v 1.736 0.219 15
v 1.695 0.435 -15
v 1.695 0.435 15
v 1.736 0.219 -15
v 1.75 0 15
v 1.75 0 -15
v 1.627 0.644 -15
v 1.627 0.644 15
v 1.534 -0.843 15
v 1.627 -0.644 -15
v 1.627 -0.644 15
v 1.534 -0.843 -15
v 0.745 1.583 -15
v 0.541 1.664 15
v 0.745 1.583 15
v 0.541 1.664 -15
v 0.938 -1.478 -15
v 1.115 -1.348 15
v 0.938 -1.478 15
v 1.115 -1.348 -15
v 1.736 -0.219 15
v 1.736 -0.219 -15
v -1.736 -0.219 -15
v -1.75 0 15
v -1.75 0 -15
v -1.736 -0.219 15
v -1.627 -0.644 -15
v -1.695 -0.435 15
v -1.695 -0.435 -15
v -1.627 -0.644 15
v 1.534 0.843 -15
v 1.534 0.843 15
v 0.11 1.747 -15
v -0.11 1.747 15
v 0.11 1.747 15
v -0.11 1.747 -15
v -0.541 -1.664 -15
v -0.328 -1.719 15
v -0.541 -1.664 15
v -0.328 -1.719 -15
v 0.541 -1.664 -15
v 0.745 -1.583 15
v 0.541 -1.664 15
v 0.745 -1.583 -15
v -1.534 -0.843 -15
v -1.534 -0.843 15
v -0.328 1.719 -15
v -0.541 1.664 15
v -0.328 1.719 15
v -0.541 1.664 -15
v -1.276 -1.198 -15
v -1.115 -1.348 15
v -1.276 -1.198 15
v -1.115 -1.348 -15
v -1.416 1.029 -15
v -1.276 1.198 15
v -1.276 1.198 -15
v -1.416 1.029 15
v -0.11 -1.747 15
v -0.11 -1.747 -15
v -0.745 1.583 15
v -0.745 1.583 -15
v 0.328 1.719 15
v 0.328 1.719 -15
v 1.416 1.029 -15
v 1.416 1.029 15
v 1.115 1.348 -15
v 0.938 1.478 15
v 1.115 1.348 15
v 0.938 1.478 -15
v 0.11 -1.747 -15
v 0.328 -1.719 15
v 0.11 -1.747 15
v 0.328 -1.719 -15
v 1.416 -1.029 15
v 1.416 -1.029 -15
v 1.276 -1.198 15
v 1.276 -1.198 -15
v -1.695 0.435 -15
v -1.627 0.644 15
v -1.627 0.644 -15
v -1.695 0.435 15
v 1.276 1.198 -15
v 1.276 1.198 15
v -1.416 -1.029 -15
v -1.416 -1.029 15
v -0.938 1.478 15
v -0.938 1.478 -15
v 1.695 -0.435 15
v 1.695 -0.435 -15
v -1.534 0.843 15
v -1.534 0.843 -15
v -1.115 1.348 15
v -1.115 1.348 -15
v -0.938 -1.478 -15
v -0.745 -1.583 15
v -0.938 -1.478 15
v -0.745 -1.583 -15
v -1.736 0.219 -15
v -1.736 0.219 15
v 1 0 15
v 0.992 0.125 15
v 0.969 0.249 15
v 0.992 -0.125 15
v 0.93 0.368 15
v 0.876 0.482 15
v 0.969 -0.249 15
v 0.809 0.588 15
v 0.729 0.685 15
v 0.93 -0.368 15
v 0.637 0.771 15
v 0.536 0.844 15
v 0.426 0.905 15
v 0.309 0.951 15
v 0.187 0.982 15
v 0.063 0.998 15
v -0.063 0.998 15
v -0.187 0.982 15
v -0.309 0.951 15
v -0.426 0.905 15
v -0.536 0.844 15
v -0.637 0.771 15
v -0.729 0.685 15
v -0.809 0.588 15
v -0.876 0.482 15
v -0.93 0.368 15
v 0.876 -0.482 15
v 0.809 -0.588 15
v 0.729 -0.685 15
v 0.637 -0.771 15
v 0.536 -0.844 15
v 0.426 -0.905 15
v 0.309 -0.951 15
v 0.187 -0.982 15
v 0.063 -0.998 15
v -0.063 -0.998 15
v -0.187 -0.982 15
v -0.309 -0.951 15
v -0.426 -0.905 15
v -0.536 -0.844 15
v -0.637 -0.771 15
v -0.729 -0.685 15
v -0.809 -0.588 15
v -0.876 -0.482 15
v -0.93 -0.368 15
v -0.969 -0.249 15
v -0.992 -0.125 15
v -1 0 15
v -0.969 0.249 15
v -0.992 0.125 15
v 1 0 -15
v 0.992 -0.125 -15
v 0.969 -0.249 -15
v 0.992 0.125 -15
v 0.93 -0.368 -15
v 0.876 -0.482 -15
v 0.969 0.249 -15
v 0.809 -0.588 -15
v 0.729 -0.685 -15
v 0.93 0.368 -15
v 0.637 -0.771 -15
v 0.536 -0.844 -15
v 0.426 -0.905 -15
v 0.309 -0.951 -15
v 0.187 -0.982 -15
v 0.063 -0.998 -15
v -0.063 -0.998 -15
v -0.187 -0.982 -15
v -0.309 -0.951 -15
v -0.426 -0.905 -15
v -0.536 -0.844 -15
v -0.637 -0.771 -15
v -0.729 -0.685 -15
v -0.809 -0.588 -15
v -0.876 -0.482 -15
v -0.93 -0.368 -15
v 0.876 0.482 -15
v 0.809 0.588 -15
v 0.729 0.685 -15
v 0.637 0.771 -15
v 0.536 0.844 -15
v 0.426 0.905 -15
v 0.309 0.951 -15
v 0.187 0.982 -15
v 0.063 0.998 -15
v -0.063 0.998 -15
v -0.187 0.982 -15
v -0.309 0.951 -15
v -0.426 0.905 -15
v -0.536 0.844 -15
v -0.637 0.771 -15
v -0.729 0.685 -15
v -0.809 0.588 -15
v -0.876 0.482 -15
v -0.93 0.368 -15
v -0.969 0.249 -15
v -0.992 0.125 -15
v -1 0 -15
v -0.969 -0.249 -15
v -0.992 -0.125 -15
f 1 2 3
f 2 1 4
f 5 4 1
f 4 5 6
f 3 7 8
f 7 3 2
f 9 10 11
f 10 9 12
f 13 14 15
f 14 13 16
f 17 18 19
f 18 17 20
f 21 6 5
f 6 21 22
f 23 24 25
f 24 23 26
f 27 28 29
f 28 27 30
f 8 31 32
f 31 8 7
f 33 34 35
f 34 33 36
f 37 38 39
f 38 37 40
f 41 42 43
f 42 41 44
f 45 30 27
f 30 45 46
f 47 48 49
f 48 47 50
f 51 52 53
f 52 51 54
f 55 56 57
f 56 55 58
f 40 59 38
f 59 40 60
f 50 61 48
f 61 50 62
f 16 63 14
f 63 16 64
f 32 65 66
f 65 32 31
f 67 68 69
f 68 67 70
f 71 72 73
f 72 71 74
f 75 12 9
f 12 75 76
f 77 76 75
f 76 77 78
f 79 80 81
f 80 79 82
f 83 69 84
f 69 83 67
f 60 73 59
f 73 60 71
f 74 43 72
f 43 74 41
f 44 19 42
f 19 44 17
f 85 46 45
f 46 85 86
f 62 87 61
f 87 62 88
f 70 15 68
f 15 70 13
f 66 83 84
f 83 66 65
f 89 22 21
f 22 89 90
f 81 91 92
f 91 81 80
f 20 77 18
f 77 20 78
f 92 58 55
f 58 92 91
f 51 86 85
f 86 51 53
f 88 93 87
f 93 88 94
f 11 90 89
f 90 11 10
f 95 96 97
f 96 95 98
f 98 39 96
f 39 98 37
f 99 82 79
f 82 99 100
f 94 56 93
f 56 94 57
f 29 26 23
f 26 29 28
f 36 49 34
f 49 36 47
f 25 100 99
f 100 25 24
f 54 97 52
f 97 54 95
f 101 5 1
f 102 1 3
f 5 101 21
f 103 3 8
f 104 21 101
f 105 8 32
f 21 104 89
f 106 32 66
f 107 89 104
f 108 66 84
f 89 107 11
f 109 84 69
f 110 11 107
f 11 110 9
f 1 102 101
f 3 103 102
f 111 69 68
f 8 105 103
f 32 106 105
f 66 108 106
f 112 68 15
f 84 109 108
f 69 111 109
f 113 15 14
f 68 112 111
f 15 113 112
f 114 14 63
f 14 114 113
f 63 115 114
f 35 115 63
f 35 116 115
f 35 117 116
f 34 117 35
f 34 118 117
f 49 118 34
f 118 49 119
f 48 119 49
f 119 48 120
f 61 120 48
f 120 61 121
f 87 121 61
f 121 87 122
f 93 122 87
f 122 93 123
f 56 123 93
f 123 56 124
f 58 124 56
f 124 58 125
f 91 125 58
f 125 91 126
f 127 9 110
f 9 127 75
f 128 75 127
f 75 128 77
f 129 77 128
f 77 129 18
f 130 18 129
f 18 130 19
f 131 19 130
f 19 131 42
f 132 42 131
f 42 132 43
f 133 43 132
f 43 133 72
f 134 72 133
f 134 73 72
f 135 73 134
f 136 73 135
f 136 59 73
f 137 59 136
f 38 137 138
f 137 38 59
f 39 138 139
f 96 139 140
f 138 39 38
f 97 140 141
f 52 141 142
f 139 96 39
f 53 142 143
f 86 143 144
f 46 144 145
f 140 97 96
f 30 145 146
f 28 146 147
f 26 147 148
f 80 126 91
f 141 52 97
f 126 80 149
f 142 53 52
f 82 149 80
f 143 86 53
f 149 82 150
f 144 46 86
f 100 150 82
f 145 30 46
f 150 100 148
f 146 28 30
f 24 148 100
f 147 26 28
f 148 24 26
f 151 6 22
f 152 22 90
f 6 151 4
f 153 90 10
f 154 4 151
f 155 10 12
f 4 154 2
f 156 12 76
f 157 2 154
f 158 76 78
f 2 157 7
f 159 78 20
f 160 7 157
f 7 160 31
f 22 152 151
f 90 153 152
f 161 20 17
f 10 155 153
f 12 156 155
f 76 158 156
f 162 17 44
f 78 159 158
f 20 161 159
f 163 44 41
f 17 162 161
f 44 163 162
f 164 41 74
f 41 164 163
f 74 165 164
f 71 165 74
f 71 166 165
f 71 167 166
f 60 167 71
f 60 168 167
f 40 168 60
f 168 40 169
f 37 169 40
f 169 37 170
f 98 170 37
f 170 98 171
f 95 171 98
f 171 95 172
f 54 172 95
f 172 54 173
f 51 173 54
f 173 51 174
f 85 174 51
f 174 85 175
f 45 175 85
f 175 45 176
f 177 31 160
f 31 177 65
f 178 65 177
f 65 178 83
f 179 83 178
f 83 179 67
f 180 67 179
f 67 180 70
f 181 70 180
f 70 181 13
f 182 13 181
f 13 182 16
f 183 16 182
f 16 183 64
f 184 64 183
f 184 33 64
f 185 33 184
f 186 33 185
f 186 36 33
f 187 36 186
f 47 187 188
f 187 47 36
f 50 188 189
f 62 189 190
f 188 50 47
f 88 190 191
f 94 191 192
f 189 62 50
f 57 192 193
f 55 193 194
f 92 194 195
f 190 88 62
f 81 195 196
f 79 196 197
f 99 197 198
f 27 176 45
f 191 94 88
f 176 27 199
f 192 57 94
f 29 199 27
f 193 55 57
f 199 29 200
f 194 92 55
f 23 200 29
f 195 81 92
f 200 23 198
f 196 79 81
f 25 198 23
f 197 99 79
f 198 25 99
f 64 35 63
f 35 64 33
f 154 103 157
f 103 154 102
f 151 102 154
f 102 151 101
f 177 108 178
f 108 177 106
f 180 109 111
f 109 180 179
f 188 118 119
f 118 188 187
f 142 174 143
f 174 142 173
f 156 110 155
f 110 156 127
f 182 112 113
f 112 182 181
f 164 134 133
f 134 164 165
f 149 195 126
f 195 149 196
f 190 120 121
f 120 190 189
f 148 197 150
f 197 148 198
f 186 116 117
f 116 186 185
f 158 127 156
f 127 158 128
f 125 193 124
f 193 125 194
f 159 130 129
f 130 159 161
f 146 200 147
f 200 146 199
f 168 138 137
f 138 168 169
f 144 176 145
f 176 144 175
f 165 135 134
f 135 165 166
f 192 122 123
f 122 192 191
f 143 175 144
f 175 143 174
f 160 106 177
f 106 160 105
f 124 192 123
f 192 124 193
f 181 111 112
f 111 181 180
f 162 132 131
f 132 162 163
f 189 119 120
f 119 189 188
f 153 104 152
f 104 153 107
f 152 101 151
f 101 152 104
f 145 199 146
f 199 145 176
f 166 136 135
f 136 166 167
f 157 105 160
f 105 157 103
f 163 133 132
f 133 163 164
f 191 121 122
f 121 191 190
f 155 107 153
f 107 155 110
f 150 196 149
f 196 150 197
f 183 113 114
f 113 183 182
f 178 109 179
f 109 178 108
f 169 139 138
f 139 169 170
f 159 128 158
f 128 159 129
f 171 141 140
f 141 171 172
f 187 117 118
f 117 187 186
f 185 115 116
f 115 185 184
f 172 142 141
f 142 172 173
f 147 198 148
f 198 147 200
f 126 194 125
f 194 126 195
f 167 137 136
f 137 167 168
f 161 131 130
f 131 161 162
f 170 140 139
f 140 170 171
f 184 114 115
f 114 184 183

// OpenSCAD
$fn = 50;


difference() {
	union() {
		translate(v = [0, 0, -15.0000000000]) {
			cylinder(h = 30, r = 1.7500000000);
		}
	}
	union() {
		translate(v = [0, 0, -100.0000000000]) {
			cylinder(h = 200, r = 1.0000000000);
		}
	}
}
